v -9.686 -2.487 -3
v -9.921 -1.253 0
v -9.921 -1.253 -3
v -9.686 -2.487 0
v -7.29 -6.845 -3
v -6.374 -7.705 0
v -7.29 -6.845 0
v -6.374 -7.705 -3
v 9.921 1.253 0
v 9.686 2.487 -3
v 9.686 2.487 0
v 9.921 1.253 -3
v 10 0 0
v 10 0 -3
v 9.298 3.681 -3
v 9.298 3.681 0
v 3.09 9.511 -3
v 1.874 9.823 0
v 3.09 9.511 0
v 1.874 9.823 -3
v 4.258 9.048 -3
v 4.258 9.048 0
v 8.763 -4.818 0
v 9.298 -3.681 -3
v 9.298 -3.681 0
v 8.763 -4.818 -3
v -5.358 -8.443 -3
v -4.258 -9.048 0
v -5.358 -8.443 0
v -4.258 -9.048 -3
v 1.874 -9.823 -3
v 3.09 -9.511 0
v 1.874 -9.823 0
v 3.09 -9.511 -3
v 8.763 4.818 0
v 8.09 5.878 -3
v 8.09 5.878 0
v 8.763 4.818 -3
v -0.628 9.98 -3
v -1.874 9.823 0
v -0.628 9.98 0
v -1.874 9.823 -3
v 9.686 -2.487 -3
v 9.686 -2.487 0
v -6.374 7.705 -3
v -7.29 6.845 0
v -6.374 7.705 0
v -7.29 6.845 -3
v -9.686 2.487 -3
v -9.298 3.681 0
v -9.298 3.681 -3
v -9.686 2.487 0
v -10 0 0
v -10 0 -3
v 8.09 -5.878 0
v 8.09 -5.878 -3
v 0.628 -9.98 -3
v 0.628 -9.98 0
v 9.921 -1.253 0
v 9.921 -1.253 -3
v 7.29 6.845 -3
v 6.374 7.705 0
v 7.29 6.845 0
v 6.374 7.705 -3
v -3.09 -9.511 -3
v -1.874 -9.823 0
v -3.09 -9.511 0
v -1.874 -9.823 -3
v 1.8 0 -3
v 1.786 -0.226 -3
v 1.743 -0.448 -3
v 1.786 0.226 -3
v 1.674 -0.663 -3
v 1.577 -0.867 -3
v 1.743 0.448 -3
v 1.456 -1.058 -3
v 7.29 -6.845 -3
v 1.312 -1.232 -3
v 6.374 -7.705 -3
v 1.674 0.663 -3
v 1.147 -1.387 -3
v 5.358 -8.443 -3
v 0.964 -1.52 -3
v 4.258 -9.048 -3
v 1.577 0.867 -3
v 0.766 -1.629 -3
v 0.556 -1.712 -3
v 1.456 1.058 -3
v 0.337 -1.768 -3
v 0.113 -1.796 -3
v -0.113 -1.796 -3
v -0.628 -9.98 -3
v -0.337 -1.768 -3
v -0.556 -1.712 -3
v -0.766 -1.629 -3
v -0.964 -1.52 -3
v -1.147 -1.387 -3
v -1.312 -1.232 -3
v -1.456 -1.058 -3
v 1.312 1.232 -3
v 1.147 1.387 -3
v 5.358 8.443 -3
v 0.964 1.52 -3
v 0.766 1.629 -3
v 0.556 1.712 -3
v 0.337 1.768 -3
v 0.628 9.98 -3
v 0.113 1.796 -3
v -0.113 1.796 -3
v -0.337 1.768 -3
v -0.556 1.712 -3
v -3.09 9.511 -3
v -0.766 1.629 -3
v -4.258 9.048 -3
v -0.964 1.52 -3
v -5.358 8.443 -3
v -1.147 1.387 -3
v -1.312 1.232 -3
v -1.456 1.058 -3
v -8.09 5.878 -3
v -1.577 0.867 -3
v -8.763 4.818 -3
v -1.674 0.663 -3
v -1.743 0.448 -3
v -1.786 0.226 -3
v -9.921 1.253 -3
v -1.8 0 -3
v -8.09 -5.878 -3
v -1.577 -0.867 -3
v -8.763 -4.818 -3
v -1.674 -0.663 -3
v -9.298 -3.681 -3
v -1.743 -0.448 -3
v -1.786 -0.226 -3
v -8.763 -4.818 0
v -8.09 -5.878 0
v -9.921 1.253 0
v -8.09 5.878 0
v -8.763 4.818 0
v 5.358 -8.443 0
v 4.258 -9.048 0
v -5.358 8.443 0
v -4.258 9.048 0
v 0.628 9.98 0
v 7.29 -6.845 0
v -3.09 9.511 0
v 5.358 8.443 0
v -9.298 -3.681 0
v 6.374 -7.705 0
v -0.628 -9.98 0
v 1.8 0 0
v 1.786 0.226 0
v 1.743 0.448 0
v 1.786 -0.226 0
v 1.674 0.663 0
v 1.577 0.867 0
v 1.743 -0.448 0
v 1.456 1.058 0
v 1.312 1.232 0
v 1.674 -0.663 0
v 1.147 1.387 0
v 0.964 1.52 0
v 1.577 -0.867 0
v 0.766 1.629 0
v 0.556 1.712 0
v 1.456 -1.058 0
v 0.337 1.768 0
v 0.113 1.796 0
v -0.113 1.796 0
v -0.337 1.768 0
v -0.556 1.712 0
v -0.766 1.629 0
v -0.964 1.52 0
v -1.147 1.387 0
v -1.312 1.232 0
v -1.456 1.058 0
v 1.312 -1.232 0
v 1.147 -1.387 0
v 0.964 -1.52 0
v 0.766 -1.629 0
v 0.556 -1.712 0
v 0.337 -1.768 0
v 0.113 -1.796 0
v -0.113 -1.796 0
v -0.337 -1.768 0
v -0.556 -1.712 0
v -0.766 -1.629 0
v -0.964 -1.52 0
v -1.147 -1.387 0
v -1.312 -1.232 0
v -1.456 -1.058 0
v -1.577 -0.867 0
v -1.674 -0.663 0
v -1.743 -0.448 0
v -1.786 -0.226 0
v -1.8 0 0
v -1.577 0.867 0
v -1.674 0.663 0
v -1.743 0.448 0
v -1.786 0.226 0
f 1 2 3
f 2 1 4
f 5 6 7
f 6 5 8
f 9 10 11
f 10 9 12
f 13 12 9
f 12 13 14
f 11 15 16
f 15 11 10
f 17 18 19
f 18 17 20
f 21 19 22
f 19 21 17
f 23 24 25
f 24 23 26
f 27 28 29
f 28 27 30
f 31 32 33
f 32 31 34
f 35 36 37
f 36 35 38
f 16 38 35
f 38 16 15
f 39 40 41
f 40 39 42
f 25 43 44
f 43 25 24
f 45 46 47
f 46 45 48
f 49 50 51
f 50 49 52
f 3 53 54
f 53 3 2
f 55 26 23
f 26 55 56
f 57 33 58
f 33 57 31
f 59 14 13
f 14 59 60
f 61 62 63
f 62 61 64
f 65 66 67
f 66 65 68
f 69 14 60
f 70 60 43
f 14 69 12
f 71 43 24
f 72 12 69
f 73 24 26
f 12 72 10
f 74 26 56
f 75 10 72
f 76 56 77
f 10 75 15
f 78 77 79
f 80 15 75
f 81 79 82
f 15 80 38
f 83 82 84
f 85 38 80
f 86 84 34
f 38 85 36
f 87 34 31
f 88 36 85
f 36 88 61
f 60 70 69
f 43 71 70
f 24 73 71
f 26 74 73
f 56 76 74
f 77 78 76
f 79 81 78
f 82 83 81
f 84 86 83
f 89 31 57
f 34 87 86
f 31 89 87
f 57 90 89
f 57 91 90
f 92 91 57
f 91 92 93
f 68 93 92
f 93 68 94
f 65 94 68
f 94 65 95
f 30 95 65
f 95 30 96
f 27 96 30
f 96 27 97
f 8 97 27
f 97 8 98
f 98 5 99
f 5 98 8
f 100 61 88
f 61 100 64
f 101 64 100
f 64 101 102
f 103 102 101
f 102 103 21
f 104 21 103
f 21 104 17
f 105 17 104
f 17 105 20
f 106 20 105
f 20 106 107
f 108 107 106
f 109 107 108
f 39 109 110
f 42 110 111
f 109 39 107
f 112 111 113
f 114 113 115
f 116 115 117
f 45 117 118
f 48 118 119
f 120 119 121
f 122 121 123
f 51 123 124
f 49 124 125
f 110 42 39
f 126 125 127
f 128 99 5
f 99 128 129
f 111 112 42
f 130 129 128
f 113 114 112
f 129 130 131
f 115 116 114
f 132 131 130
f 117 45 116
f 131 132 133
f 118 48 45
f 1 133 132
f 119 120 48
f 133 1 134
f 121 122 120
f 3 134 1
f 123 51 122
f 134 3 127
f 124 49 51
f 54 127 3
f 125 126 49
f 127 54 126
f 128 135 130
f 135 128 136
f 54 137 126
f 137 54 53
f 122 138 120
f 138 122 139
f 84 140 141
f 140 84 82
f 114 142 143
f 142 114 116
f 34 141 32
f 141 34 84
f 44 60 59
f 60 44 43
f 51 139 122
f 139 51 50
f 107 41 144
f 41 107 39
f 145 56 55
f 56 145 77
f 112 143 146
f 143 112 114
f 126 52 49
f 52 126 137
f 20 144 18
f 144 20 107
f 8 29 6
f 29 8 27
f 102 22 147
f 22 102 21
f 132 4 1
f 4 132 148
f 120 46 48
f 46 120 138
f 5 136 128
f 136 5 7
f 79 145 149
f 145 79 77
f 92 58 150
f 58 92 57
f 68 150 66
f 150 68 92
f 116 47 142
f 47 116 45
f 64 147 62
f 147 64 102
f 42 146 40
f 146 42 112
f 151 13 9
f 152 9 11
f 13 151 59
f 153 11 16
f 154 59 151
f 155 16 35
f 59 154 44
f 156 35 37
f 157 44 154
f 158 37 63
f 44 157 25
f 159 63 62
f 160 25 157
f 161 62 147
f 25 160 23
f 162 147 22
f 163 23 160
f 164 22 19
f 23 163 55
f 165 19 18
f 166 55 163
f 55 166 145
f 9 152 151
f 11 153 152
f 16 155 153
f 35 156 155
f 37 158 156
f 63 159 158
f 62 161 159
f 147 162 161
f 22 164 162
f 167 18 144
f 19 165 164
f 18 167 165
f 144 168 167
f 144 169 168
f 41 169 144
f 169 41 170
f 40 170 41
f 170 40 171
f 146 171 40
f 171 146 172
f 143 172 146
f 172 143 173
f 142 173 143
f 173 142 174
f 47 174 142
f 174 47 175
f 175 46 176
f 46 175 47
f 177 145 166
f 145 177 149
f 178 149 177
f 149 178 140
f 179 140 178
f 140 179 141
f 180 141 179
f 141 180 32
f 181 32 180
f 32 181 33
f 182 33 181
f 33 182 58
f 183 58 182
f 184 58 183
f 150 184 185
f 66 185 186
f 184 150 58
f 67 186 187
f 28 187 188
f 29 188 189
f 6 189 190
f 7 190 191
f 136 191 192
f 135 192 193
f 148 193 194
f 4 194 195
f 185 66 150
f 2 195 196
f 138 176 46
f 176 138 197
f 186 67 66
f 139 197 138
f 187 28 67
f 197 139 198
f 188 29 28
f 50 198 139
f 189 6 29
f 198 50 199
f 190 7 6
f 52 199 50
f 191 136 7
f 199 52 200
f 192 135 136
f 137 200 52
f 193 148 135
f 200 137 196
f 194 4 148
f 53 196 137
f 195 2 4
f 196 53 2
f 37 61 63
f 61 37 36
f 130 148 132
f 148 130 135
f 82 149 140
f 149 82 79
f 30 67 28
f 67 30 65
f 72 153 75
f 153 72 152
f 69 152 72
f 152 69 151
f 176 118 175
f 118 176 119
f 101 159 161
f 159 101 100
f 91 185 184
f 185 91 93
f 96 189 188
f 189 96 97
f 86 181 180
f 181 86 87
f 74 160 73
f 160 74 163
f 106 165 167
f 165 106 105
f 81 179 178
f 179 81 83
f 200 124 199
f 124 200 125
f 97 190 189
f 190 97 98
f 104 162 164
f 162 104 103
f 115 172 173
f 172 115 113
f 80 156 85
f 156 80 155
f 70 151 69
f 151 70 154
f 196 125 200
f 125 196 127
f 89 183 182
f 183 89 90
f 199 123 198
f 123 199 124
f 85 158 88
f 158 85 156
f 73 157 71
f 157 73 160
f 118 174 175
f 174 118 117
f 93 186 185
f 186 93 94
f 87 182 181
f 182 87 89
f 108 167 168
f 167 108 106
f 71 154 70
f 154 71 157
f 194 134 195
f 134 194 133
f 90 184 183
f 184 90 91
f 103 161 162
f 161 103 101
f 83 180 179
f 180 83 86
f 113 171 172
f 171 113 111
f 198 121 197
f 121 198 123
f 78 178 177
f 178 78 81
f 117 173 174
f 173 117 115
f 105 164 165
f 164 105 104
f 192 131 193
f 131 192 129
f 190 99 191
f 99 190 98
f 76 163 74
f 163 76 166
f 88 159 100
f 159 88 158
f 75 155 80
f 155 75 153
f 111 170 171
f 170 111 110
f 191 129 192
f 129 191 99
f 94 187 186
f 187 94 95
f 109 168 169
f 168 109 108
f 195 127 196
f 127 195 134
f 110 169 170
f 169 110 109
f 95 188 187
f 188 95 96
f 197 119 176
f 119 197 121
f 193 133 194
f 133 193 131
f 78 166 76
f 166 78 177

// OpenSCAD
$fn = 50;


difference() {
	union() {
		translate(v = [0, 0, -3.0000000000]) {
			cylinder(h = 3, r = 10.0000000000);
		}
		cylinder(h = 0, r = 20.0000000000);
	}
	union() {
		#translate(v = [0, 0, -3]) {
			cylinder(h = 3, r = 1.8000000000);
		}
	}
}
